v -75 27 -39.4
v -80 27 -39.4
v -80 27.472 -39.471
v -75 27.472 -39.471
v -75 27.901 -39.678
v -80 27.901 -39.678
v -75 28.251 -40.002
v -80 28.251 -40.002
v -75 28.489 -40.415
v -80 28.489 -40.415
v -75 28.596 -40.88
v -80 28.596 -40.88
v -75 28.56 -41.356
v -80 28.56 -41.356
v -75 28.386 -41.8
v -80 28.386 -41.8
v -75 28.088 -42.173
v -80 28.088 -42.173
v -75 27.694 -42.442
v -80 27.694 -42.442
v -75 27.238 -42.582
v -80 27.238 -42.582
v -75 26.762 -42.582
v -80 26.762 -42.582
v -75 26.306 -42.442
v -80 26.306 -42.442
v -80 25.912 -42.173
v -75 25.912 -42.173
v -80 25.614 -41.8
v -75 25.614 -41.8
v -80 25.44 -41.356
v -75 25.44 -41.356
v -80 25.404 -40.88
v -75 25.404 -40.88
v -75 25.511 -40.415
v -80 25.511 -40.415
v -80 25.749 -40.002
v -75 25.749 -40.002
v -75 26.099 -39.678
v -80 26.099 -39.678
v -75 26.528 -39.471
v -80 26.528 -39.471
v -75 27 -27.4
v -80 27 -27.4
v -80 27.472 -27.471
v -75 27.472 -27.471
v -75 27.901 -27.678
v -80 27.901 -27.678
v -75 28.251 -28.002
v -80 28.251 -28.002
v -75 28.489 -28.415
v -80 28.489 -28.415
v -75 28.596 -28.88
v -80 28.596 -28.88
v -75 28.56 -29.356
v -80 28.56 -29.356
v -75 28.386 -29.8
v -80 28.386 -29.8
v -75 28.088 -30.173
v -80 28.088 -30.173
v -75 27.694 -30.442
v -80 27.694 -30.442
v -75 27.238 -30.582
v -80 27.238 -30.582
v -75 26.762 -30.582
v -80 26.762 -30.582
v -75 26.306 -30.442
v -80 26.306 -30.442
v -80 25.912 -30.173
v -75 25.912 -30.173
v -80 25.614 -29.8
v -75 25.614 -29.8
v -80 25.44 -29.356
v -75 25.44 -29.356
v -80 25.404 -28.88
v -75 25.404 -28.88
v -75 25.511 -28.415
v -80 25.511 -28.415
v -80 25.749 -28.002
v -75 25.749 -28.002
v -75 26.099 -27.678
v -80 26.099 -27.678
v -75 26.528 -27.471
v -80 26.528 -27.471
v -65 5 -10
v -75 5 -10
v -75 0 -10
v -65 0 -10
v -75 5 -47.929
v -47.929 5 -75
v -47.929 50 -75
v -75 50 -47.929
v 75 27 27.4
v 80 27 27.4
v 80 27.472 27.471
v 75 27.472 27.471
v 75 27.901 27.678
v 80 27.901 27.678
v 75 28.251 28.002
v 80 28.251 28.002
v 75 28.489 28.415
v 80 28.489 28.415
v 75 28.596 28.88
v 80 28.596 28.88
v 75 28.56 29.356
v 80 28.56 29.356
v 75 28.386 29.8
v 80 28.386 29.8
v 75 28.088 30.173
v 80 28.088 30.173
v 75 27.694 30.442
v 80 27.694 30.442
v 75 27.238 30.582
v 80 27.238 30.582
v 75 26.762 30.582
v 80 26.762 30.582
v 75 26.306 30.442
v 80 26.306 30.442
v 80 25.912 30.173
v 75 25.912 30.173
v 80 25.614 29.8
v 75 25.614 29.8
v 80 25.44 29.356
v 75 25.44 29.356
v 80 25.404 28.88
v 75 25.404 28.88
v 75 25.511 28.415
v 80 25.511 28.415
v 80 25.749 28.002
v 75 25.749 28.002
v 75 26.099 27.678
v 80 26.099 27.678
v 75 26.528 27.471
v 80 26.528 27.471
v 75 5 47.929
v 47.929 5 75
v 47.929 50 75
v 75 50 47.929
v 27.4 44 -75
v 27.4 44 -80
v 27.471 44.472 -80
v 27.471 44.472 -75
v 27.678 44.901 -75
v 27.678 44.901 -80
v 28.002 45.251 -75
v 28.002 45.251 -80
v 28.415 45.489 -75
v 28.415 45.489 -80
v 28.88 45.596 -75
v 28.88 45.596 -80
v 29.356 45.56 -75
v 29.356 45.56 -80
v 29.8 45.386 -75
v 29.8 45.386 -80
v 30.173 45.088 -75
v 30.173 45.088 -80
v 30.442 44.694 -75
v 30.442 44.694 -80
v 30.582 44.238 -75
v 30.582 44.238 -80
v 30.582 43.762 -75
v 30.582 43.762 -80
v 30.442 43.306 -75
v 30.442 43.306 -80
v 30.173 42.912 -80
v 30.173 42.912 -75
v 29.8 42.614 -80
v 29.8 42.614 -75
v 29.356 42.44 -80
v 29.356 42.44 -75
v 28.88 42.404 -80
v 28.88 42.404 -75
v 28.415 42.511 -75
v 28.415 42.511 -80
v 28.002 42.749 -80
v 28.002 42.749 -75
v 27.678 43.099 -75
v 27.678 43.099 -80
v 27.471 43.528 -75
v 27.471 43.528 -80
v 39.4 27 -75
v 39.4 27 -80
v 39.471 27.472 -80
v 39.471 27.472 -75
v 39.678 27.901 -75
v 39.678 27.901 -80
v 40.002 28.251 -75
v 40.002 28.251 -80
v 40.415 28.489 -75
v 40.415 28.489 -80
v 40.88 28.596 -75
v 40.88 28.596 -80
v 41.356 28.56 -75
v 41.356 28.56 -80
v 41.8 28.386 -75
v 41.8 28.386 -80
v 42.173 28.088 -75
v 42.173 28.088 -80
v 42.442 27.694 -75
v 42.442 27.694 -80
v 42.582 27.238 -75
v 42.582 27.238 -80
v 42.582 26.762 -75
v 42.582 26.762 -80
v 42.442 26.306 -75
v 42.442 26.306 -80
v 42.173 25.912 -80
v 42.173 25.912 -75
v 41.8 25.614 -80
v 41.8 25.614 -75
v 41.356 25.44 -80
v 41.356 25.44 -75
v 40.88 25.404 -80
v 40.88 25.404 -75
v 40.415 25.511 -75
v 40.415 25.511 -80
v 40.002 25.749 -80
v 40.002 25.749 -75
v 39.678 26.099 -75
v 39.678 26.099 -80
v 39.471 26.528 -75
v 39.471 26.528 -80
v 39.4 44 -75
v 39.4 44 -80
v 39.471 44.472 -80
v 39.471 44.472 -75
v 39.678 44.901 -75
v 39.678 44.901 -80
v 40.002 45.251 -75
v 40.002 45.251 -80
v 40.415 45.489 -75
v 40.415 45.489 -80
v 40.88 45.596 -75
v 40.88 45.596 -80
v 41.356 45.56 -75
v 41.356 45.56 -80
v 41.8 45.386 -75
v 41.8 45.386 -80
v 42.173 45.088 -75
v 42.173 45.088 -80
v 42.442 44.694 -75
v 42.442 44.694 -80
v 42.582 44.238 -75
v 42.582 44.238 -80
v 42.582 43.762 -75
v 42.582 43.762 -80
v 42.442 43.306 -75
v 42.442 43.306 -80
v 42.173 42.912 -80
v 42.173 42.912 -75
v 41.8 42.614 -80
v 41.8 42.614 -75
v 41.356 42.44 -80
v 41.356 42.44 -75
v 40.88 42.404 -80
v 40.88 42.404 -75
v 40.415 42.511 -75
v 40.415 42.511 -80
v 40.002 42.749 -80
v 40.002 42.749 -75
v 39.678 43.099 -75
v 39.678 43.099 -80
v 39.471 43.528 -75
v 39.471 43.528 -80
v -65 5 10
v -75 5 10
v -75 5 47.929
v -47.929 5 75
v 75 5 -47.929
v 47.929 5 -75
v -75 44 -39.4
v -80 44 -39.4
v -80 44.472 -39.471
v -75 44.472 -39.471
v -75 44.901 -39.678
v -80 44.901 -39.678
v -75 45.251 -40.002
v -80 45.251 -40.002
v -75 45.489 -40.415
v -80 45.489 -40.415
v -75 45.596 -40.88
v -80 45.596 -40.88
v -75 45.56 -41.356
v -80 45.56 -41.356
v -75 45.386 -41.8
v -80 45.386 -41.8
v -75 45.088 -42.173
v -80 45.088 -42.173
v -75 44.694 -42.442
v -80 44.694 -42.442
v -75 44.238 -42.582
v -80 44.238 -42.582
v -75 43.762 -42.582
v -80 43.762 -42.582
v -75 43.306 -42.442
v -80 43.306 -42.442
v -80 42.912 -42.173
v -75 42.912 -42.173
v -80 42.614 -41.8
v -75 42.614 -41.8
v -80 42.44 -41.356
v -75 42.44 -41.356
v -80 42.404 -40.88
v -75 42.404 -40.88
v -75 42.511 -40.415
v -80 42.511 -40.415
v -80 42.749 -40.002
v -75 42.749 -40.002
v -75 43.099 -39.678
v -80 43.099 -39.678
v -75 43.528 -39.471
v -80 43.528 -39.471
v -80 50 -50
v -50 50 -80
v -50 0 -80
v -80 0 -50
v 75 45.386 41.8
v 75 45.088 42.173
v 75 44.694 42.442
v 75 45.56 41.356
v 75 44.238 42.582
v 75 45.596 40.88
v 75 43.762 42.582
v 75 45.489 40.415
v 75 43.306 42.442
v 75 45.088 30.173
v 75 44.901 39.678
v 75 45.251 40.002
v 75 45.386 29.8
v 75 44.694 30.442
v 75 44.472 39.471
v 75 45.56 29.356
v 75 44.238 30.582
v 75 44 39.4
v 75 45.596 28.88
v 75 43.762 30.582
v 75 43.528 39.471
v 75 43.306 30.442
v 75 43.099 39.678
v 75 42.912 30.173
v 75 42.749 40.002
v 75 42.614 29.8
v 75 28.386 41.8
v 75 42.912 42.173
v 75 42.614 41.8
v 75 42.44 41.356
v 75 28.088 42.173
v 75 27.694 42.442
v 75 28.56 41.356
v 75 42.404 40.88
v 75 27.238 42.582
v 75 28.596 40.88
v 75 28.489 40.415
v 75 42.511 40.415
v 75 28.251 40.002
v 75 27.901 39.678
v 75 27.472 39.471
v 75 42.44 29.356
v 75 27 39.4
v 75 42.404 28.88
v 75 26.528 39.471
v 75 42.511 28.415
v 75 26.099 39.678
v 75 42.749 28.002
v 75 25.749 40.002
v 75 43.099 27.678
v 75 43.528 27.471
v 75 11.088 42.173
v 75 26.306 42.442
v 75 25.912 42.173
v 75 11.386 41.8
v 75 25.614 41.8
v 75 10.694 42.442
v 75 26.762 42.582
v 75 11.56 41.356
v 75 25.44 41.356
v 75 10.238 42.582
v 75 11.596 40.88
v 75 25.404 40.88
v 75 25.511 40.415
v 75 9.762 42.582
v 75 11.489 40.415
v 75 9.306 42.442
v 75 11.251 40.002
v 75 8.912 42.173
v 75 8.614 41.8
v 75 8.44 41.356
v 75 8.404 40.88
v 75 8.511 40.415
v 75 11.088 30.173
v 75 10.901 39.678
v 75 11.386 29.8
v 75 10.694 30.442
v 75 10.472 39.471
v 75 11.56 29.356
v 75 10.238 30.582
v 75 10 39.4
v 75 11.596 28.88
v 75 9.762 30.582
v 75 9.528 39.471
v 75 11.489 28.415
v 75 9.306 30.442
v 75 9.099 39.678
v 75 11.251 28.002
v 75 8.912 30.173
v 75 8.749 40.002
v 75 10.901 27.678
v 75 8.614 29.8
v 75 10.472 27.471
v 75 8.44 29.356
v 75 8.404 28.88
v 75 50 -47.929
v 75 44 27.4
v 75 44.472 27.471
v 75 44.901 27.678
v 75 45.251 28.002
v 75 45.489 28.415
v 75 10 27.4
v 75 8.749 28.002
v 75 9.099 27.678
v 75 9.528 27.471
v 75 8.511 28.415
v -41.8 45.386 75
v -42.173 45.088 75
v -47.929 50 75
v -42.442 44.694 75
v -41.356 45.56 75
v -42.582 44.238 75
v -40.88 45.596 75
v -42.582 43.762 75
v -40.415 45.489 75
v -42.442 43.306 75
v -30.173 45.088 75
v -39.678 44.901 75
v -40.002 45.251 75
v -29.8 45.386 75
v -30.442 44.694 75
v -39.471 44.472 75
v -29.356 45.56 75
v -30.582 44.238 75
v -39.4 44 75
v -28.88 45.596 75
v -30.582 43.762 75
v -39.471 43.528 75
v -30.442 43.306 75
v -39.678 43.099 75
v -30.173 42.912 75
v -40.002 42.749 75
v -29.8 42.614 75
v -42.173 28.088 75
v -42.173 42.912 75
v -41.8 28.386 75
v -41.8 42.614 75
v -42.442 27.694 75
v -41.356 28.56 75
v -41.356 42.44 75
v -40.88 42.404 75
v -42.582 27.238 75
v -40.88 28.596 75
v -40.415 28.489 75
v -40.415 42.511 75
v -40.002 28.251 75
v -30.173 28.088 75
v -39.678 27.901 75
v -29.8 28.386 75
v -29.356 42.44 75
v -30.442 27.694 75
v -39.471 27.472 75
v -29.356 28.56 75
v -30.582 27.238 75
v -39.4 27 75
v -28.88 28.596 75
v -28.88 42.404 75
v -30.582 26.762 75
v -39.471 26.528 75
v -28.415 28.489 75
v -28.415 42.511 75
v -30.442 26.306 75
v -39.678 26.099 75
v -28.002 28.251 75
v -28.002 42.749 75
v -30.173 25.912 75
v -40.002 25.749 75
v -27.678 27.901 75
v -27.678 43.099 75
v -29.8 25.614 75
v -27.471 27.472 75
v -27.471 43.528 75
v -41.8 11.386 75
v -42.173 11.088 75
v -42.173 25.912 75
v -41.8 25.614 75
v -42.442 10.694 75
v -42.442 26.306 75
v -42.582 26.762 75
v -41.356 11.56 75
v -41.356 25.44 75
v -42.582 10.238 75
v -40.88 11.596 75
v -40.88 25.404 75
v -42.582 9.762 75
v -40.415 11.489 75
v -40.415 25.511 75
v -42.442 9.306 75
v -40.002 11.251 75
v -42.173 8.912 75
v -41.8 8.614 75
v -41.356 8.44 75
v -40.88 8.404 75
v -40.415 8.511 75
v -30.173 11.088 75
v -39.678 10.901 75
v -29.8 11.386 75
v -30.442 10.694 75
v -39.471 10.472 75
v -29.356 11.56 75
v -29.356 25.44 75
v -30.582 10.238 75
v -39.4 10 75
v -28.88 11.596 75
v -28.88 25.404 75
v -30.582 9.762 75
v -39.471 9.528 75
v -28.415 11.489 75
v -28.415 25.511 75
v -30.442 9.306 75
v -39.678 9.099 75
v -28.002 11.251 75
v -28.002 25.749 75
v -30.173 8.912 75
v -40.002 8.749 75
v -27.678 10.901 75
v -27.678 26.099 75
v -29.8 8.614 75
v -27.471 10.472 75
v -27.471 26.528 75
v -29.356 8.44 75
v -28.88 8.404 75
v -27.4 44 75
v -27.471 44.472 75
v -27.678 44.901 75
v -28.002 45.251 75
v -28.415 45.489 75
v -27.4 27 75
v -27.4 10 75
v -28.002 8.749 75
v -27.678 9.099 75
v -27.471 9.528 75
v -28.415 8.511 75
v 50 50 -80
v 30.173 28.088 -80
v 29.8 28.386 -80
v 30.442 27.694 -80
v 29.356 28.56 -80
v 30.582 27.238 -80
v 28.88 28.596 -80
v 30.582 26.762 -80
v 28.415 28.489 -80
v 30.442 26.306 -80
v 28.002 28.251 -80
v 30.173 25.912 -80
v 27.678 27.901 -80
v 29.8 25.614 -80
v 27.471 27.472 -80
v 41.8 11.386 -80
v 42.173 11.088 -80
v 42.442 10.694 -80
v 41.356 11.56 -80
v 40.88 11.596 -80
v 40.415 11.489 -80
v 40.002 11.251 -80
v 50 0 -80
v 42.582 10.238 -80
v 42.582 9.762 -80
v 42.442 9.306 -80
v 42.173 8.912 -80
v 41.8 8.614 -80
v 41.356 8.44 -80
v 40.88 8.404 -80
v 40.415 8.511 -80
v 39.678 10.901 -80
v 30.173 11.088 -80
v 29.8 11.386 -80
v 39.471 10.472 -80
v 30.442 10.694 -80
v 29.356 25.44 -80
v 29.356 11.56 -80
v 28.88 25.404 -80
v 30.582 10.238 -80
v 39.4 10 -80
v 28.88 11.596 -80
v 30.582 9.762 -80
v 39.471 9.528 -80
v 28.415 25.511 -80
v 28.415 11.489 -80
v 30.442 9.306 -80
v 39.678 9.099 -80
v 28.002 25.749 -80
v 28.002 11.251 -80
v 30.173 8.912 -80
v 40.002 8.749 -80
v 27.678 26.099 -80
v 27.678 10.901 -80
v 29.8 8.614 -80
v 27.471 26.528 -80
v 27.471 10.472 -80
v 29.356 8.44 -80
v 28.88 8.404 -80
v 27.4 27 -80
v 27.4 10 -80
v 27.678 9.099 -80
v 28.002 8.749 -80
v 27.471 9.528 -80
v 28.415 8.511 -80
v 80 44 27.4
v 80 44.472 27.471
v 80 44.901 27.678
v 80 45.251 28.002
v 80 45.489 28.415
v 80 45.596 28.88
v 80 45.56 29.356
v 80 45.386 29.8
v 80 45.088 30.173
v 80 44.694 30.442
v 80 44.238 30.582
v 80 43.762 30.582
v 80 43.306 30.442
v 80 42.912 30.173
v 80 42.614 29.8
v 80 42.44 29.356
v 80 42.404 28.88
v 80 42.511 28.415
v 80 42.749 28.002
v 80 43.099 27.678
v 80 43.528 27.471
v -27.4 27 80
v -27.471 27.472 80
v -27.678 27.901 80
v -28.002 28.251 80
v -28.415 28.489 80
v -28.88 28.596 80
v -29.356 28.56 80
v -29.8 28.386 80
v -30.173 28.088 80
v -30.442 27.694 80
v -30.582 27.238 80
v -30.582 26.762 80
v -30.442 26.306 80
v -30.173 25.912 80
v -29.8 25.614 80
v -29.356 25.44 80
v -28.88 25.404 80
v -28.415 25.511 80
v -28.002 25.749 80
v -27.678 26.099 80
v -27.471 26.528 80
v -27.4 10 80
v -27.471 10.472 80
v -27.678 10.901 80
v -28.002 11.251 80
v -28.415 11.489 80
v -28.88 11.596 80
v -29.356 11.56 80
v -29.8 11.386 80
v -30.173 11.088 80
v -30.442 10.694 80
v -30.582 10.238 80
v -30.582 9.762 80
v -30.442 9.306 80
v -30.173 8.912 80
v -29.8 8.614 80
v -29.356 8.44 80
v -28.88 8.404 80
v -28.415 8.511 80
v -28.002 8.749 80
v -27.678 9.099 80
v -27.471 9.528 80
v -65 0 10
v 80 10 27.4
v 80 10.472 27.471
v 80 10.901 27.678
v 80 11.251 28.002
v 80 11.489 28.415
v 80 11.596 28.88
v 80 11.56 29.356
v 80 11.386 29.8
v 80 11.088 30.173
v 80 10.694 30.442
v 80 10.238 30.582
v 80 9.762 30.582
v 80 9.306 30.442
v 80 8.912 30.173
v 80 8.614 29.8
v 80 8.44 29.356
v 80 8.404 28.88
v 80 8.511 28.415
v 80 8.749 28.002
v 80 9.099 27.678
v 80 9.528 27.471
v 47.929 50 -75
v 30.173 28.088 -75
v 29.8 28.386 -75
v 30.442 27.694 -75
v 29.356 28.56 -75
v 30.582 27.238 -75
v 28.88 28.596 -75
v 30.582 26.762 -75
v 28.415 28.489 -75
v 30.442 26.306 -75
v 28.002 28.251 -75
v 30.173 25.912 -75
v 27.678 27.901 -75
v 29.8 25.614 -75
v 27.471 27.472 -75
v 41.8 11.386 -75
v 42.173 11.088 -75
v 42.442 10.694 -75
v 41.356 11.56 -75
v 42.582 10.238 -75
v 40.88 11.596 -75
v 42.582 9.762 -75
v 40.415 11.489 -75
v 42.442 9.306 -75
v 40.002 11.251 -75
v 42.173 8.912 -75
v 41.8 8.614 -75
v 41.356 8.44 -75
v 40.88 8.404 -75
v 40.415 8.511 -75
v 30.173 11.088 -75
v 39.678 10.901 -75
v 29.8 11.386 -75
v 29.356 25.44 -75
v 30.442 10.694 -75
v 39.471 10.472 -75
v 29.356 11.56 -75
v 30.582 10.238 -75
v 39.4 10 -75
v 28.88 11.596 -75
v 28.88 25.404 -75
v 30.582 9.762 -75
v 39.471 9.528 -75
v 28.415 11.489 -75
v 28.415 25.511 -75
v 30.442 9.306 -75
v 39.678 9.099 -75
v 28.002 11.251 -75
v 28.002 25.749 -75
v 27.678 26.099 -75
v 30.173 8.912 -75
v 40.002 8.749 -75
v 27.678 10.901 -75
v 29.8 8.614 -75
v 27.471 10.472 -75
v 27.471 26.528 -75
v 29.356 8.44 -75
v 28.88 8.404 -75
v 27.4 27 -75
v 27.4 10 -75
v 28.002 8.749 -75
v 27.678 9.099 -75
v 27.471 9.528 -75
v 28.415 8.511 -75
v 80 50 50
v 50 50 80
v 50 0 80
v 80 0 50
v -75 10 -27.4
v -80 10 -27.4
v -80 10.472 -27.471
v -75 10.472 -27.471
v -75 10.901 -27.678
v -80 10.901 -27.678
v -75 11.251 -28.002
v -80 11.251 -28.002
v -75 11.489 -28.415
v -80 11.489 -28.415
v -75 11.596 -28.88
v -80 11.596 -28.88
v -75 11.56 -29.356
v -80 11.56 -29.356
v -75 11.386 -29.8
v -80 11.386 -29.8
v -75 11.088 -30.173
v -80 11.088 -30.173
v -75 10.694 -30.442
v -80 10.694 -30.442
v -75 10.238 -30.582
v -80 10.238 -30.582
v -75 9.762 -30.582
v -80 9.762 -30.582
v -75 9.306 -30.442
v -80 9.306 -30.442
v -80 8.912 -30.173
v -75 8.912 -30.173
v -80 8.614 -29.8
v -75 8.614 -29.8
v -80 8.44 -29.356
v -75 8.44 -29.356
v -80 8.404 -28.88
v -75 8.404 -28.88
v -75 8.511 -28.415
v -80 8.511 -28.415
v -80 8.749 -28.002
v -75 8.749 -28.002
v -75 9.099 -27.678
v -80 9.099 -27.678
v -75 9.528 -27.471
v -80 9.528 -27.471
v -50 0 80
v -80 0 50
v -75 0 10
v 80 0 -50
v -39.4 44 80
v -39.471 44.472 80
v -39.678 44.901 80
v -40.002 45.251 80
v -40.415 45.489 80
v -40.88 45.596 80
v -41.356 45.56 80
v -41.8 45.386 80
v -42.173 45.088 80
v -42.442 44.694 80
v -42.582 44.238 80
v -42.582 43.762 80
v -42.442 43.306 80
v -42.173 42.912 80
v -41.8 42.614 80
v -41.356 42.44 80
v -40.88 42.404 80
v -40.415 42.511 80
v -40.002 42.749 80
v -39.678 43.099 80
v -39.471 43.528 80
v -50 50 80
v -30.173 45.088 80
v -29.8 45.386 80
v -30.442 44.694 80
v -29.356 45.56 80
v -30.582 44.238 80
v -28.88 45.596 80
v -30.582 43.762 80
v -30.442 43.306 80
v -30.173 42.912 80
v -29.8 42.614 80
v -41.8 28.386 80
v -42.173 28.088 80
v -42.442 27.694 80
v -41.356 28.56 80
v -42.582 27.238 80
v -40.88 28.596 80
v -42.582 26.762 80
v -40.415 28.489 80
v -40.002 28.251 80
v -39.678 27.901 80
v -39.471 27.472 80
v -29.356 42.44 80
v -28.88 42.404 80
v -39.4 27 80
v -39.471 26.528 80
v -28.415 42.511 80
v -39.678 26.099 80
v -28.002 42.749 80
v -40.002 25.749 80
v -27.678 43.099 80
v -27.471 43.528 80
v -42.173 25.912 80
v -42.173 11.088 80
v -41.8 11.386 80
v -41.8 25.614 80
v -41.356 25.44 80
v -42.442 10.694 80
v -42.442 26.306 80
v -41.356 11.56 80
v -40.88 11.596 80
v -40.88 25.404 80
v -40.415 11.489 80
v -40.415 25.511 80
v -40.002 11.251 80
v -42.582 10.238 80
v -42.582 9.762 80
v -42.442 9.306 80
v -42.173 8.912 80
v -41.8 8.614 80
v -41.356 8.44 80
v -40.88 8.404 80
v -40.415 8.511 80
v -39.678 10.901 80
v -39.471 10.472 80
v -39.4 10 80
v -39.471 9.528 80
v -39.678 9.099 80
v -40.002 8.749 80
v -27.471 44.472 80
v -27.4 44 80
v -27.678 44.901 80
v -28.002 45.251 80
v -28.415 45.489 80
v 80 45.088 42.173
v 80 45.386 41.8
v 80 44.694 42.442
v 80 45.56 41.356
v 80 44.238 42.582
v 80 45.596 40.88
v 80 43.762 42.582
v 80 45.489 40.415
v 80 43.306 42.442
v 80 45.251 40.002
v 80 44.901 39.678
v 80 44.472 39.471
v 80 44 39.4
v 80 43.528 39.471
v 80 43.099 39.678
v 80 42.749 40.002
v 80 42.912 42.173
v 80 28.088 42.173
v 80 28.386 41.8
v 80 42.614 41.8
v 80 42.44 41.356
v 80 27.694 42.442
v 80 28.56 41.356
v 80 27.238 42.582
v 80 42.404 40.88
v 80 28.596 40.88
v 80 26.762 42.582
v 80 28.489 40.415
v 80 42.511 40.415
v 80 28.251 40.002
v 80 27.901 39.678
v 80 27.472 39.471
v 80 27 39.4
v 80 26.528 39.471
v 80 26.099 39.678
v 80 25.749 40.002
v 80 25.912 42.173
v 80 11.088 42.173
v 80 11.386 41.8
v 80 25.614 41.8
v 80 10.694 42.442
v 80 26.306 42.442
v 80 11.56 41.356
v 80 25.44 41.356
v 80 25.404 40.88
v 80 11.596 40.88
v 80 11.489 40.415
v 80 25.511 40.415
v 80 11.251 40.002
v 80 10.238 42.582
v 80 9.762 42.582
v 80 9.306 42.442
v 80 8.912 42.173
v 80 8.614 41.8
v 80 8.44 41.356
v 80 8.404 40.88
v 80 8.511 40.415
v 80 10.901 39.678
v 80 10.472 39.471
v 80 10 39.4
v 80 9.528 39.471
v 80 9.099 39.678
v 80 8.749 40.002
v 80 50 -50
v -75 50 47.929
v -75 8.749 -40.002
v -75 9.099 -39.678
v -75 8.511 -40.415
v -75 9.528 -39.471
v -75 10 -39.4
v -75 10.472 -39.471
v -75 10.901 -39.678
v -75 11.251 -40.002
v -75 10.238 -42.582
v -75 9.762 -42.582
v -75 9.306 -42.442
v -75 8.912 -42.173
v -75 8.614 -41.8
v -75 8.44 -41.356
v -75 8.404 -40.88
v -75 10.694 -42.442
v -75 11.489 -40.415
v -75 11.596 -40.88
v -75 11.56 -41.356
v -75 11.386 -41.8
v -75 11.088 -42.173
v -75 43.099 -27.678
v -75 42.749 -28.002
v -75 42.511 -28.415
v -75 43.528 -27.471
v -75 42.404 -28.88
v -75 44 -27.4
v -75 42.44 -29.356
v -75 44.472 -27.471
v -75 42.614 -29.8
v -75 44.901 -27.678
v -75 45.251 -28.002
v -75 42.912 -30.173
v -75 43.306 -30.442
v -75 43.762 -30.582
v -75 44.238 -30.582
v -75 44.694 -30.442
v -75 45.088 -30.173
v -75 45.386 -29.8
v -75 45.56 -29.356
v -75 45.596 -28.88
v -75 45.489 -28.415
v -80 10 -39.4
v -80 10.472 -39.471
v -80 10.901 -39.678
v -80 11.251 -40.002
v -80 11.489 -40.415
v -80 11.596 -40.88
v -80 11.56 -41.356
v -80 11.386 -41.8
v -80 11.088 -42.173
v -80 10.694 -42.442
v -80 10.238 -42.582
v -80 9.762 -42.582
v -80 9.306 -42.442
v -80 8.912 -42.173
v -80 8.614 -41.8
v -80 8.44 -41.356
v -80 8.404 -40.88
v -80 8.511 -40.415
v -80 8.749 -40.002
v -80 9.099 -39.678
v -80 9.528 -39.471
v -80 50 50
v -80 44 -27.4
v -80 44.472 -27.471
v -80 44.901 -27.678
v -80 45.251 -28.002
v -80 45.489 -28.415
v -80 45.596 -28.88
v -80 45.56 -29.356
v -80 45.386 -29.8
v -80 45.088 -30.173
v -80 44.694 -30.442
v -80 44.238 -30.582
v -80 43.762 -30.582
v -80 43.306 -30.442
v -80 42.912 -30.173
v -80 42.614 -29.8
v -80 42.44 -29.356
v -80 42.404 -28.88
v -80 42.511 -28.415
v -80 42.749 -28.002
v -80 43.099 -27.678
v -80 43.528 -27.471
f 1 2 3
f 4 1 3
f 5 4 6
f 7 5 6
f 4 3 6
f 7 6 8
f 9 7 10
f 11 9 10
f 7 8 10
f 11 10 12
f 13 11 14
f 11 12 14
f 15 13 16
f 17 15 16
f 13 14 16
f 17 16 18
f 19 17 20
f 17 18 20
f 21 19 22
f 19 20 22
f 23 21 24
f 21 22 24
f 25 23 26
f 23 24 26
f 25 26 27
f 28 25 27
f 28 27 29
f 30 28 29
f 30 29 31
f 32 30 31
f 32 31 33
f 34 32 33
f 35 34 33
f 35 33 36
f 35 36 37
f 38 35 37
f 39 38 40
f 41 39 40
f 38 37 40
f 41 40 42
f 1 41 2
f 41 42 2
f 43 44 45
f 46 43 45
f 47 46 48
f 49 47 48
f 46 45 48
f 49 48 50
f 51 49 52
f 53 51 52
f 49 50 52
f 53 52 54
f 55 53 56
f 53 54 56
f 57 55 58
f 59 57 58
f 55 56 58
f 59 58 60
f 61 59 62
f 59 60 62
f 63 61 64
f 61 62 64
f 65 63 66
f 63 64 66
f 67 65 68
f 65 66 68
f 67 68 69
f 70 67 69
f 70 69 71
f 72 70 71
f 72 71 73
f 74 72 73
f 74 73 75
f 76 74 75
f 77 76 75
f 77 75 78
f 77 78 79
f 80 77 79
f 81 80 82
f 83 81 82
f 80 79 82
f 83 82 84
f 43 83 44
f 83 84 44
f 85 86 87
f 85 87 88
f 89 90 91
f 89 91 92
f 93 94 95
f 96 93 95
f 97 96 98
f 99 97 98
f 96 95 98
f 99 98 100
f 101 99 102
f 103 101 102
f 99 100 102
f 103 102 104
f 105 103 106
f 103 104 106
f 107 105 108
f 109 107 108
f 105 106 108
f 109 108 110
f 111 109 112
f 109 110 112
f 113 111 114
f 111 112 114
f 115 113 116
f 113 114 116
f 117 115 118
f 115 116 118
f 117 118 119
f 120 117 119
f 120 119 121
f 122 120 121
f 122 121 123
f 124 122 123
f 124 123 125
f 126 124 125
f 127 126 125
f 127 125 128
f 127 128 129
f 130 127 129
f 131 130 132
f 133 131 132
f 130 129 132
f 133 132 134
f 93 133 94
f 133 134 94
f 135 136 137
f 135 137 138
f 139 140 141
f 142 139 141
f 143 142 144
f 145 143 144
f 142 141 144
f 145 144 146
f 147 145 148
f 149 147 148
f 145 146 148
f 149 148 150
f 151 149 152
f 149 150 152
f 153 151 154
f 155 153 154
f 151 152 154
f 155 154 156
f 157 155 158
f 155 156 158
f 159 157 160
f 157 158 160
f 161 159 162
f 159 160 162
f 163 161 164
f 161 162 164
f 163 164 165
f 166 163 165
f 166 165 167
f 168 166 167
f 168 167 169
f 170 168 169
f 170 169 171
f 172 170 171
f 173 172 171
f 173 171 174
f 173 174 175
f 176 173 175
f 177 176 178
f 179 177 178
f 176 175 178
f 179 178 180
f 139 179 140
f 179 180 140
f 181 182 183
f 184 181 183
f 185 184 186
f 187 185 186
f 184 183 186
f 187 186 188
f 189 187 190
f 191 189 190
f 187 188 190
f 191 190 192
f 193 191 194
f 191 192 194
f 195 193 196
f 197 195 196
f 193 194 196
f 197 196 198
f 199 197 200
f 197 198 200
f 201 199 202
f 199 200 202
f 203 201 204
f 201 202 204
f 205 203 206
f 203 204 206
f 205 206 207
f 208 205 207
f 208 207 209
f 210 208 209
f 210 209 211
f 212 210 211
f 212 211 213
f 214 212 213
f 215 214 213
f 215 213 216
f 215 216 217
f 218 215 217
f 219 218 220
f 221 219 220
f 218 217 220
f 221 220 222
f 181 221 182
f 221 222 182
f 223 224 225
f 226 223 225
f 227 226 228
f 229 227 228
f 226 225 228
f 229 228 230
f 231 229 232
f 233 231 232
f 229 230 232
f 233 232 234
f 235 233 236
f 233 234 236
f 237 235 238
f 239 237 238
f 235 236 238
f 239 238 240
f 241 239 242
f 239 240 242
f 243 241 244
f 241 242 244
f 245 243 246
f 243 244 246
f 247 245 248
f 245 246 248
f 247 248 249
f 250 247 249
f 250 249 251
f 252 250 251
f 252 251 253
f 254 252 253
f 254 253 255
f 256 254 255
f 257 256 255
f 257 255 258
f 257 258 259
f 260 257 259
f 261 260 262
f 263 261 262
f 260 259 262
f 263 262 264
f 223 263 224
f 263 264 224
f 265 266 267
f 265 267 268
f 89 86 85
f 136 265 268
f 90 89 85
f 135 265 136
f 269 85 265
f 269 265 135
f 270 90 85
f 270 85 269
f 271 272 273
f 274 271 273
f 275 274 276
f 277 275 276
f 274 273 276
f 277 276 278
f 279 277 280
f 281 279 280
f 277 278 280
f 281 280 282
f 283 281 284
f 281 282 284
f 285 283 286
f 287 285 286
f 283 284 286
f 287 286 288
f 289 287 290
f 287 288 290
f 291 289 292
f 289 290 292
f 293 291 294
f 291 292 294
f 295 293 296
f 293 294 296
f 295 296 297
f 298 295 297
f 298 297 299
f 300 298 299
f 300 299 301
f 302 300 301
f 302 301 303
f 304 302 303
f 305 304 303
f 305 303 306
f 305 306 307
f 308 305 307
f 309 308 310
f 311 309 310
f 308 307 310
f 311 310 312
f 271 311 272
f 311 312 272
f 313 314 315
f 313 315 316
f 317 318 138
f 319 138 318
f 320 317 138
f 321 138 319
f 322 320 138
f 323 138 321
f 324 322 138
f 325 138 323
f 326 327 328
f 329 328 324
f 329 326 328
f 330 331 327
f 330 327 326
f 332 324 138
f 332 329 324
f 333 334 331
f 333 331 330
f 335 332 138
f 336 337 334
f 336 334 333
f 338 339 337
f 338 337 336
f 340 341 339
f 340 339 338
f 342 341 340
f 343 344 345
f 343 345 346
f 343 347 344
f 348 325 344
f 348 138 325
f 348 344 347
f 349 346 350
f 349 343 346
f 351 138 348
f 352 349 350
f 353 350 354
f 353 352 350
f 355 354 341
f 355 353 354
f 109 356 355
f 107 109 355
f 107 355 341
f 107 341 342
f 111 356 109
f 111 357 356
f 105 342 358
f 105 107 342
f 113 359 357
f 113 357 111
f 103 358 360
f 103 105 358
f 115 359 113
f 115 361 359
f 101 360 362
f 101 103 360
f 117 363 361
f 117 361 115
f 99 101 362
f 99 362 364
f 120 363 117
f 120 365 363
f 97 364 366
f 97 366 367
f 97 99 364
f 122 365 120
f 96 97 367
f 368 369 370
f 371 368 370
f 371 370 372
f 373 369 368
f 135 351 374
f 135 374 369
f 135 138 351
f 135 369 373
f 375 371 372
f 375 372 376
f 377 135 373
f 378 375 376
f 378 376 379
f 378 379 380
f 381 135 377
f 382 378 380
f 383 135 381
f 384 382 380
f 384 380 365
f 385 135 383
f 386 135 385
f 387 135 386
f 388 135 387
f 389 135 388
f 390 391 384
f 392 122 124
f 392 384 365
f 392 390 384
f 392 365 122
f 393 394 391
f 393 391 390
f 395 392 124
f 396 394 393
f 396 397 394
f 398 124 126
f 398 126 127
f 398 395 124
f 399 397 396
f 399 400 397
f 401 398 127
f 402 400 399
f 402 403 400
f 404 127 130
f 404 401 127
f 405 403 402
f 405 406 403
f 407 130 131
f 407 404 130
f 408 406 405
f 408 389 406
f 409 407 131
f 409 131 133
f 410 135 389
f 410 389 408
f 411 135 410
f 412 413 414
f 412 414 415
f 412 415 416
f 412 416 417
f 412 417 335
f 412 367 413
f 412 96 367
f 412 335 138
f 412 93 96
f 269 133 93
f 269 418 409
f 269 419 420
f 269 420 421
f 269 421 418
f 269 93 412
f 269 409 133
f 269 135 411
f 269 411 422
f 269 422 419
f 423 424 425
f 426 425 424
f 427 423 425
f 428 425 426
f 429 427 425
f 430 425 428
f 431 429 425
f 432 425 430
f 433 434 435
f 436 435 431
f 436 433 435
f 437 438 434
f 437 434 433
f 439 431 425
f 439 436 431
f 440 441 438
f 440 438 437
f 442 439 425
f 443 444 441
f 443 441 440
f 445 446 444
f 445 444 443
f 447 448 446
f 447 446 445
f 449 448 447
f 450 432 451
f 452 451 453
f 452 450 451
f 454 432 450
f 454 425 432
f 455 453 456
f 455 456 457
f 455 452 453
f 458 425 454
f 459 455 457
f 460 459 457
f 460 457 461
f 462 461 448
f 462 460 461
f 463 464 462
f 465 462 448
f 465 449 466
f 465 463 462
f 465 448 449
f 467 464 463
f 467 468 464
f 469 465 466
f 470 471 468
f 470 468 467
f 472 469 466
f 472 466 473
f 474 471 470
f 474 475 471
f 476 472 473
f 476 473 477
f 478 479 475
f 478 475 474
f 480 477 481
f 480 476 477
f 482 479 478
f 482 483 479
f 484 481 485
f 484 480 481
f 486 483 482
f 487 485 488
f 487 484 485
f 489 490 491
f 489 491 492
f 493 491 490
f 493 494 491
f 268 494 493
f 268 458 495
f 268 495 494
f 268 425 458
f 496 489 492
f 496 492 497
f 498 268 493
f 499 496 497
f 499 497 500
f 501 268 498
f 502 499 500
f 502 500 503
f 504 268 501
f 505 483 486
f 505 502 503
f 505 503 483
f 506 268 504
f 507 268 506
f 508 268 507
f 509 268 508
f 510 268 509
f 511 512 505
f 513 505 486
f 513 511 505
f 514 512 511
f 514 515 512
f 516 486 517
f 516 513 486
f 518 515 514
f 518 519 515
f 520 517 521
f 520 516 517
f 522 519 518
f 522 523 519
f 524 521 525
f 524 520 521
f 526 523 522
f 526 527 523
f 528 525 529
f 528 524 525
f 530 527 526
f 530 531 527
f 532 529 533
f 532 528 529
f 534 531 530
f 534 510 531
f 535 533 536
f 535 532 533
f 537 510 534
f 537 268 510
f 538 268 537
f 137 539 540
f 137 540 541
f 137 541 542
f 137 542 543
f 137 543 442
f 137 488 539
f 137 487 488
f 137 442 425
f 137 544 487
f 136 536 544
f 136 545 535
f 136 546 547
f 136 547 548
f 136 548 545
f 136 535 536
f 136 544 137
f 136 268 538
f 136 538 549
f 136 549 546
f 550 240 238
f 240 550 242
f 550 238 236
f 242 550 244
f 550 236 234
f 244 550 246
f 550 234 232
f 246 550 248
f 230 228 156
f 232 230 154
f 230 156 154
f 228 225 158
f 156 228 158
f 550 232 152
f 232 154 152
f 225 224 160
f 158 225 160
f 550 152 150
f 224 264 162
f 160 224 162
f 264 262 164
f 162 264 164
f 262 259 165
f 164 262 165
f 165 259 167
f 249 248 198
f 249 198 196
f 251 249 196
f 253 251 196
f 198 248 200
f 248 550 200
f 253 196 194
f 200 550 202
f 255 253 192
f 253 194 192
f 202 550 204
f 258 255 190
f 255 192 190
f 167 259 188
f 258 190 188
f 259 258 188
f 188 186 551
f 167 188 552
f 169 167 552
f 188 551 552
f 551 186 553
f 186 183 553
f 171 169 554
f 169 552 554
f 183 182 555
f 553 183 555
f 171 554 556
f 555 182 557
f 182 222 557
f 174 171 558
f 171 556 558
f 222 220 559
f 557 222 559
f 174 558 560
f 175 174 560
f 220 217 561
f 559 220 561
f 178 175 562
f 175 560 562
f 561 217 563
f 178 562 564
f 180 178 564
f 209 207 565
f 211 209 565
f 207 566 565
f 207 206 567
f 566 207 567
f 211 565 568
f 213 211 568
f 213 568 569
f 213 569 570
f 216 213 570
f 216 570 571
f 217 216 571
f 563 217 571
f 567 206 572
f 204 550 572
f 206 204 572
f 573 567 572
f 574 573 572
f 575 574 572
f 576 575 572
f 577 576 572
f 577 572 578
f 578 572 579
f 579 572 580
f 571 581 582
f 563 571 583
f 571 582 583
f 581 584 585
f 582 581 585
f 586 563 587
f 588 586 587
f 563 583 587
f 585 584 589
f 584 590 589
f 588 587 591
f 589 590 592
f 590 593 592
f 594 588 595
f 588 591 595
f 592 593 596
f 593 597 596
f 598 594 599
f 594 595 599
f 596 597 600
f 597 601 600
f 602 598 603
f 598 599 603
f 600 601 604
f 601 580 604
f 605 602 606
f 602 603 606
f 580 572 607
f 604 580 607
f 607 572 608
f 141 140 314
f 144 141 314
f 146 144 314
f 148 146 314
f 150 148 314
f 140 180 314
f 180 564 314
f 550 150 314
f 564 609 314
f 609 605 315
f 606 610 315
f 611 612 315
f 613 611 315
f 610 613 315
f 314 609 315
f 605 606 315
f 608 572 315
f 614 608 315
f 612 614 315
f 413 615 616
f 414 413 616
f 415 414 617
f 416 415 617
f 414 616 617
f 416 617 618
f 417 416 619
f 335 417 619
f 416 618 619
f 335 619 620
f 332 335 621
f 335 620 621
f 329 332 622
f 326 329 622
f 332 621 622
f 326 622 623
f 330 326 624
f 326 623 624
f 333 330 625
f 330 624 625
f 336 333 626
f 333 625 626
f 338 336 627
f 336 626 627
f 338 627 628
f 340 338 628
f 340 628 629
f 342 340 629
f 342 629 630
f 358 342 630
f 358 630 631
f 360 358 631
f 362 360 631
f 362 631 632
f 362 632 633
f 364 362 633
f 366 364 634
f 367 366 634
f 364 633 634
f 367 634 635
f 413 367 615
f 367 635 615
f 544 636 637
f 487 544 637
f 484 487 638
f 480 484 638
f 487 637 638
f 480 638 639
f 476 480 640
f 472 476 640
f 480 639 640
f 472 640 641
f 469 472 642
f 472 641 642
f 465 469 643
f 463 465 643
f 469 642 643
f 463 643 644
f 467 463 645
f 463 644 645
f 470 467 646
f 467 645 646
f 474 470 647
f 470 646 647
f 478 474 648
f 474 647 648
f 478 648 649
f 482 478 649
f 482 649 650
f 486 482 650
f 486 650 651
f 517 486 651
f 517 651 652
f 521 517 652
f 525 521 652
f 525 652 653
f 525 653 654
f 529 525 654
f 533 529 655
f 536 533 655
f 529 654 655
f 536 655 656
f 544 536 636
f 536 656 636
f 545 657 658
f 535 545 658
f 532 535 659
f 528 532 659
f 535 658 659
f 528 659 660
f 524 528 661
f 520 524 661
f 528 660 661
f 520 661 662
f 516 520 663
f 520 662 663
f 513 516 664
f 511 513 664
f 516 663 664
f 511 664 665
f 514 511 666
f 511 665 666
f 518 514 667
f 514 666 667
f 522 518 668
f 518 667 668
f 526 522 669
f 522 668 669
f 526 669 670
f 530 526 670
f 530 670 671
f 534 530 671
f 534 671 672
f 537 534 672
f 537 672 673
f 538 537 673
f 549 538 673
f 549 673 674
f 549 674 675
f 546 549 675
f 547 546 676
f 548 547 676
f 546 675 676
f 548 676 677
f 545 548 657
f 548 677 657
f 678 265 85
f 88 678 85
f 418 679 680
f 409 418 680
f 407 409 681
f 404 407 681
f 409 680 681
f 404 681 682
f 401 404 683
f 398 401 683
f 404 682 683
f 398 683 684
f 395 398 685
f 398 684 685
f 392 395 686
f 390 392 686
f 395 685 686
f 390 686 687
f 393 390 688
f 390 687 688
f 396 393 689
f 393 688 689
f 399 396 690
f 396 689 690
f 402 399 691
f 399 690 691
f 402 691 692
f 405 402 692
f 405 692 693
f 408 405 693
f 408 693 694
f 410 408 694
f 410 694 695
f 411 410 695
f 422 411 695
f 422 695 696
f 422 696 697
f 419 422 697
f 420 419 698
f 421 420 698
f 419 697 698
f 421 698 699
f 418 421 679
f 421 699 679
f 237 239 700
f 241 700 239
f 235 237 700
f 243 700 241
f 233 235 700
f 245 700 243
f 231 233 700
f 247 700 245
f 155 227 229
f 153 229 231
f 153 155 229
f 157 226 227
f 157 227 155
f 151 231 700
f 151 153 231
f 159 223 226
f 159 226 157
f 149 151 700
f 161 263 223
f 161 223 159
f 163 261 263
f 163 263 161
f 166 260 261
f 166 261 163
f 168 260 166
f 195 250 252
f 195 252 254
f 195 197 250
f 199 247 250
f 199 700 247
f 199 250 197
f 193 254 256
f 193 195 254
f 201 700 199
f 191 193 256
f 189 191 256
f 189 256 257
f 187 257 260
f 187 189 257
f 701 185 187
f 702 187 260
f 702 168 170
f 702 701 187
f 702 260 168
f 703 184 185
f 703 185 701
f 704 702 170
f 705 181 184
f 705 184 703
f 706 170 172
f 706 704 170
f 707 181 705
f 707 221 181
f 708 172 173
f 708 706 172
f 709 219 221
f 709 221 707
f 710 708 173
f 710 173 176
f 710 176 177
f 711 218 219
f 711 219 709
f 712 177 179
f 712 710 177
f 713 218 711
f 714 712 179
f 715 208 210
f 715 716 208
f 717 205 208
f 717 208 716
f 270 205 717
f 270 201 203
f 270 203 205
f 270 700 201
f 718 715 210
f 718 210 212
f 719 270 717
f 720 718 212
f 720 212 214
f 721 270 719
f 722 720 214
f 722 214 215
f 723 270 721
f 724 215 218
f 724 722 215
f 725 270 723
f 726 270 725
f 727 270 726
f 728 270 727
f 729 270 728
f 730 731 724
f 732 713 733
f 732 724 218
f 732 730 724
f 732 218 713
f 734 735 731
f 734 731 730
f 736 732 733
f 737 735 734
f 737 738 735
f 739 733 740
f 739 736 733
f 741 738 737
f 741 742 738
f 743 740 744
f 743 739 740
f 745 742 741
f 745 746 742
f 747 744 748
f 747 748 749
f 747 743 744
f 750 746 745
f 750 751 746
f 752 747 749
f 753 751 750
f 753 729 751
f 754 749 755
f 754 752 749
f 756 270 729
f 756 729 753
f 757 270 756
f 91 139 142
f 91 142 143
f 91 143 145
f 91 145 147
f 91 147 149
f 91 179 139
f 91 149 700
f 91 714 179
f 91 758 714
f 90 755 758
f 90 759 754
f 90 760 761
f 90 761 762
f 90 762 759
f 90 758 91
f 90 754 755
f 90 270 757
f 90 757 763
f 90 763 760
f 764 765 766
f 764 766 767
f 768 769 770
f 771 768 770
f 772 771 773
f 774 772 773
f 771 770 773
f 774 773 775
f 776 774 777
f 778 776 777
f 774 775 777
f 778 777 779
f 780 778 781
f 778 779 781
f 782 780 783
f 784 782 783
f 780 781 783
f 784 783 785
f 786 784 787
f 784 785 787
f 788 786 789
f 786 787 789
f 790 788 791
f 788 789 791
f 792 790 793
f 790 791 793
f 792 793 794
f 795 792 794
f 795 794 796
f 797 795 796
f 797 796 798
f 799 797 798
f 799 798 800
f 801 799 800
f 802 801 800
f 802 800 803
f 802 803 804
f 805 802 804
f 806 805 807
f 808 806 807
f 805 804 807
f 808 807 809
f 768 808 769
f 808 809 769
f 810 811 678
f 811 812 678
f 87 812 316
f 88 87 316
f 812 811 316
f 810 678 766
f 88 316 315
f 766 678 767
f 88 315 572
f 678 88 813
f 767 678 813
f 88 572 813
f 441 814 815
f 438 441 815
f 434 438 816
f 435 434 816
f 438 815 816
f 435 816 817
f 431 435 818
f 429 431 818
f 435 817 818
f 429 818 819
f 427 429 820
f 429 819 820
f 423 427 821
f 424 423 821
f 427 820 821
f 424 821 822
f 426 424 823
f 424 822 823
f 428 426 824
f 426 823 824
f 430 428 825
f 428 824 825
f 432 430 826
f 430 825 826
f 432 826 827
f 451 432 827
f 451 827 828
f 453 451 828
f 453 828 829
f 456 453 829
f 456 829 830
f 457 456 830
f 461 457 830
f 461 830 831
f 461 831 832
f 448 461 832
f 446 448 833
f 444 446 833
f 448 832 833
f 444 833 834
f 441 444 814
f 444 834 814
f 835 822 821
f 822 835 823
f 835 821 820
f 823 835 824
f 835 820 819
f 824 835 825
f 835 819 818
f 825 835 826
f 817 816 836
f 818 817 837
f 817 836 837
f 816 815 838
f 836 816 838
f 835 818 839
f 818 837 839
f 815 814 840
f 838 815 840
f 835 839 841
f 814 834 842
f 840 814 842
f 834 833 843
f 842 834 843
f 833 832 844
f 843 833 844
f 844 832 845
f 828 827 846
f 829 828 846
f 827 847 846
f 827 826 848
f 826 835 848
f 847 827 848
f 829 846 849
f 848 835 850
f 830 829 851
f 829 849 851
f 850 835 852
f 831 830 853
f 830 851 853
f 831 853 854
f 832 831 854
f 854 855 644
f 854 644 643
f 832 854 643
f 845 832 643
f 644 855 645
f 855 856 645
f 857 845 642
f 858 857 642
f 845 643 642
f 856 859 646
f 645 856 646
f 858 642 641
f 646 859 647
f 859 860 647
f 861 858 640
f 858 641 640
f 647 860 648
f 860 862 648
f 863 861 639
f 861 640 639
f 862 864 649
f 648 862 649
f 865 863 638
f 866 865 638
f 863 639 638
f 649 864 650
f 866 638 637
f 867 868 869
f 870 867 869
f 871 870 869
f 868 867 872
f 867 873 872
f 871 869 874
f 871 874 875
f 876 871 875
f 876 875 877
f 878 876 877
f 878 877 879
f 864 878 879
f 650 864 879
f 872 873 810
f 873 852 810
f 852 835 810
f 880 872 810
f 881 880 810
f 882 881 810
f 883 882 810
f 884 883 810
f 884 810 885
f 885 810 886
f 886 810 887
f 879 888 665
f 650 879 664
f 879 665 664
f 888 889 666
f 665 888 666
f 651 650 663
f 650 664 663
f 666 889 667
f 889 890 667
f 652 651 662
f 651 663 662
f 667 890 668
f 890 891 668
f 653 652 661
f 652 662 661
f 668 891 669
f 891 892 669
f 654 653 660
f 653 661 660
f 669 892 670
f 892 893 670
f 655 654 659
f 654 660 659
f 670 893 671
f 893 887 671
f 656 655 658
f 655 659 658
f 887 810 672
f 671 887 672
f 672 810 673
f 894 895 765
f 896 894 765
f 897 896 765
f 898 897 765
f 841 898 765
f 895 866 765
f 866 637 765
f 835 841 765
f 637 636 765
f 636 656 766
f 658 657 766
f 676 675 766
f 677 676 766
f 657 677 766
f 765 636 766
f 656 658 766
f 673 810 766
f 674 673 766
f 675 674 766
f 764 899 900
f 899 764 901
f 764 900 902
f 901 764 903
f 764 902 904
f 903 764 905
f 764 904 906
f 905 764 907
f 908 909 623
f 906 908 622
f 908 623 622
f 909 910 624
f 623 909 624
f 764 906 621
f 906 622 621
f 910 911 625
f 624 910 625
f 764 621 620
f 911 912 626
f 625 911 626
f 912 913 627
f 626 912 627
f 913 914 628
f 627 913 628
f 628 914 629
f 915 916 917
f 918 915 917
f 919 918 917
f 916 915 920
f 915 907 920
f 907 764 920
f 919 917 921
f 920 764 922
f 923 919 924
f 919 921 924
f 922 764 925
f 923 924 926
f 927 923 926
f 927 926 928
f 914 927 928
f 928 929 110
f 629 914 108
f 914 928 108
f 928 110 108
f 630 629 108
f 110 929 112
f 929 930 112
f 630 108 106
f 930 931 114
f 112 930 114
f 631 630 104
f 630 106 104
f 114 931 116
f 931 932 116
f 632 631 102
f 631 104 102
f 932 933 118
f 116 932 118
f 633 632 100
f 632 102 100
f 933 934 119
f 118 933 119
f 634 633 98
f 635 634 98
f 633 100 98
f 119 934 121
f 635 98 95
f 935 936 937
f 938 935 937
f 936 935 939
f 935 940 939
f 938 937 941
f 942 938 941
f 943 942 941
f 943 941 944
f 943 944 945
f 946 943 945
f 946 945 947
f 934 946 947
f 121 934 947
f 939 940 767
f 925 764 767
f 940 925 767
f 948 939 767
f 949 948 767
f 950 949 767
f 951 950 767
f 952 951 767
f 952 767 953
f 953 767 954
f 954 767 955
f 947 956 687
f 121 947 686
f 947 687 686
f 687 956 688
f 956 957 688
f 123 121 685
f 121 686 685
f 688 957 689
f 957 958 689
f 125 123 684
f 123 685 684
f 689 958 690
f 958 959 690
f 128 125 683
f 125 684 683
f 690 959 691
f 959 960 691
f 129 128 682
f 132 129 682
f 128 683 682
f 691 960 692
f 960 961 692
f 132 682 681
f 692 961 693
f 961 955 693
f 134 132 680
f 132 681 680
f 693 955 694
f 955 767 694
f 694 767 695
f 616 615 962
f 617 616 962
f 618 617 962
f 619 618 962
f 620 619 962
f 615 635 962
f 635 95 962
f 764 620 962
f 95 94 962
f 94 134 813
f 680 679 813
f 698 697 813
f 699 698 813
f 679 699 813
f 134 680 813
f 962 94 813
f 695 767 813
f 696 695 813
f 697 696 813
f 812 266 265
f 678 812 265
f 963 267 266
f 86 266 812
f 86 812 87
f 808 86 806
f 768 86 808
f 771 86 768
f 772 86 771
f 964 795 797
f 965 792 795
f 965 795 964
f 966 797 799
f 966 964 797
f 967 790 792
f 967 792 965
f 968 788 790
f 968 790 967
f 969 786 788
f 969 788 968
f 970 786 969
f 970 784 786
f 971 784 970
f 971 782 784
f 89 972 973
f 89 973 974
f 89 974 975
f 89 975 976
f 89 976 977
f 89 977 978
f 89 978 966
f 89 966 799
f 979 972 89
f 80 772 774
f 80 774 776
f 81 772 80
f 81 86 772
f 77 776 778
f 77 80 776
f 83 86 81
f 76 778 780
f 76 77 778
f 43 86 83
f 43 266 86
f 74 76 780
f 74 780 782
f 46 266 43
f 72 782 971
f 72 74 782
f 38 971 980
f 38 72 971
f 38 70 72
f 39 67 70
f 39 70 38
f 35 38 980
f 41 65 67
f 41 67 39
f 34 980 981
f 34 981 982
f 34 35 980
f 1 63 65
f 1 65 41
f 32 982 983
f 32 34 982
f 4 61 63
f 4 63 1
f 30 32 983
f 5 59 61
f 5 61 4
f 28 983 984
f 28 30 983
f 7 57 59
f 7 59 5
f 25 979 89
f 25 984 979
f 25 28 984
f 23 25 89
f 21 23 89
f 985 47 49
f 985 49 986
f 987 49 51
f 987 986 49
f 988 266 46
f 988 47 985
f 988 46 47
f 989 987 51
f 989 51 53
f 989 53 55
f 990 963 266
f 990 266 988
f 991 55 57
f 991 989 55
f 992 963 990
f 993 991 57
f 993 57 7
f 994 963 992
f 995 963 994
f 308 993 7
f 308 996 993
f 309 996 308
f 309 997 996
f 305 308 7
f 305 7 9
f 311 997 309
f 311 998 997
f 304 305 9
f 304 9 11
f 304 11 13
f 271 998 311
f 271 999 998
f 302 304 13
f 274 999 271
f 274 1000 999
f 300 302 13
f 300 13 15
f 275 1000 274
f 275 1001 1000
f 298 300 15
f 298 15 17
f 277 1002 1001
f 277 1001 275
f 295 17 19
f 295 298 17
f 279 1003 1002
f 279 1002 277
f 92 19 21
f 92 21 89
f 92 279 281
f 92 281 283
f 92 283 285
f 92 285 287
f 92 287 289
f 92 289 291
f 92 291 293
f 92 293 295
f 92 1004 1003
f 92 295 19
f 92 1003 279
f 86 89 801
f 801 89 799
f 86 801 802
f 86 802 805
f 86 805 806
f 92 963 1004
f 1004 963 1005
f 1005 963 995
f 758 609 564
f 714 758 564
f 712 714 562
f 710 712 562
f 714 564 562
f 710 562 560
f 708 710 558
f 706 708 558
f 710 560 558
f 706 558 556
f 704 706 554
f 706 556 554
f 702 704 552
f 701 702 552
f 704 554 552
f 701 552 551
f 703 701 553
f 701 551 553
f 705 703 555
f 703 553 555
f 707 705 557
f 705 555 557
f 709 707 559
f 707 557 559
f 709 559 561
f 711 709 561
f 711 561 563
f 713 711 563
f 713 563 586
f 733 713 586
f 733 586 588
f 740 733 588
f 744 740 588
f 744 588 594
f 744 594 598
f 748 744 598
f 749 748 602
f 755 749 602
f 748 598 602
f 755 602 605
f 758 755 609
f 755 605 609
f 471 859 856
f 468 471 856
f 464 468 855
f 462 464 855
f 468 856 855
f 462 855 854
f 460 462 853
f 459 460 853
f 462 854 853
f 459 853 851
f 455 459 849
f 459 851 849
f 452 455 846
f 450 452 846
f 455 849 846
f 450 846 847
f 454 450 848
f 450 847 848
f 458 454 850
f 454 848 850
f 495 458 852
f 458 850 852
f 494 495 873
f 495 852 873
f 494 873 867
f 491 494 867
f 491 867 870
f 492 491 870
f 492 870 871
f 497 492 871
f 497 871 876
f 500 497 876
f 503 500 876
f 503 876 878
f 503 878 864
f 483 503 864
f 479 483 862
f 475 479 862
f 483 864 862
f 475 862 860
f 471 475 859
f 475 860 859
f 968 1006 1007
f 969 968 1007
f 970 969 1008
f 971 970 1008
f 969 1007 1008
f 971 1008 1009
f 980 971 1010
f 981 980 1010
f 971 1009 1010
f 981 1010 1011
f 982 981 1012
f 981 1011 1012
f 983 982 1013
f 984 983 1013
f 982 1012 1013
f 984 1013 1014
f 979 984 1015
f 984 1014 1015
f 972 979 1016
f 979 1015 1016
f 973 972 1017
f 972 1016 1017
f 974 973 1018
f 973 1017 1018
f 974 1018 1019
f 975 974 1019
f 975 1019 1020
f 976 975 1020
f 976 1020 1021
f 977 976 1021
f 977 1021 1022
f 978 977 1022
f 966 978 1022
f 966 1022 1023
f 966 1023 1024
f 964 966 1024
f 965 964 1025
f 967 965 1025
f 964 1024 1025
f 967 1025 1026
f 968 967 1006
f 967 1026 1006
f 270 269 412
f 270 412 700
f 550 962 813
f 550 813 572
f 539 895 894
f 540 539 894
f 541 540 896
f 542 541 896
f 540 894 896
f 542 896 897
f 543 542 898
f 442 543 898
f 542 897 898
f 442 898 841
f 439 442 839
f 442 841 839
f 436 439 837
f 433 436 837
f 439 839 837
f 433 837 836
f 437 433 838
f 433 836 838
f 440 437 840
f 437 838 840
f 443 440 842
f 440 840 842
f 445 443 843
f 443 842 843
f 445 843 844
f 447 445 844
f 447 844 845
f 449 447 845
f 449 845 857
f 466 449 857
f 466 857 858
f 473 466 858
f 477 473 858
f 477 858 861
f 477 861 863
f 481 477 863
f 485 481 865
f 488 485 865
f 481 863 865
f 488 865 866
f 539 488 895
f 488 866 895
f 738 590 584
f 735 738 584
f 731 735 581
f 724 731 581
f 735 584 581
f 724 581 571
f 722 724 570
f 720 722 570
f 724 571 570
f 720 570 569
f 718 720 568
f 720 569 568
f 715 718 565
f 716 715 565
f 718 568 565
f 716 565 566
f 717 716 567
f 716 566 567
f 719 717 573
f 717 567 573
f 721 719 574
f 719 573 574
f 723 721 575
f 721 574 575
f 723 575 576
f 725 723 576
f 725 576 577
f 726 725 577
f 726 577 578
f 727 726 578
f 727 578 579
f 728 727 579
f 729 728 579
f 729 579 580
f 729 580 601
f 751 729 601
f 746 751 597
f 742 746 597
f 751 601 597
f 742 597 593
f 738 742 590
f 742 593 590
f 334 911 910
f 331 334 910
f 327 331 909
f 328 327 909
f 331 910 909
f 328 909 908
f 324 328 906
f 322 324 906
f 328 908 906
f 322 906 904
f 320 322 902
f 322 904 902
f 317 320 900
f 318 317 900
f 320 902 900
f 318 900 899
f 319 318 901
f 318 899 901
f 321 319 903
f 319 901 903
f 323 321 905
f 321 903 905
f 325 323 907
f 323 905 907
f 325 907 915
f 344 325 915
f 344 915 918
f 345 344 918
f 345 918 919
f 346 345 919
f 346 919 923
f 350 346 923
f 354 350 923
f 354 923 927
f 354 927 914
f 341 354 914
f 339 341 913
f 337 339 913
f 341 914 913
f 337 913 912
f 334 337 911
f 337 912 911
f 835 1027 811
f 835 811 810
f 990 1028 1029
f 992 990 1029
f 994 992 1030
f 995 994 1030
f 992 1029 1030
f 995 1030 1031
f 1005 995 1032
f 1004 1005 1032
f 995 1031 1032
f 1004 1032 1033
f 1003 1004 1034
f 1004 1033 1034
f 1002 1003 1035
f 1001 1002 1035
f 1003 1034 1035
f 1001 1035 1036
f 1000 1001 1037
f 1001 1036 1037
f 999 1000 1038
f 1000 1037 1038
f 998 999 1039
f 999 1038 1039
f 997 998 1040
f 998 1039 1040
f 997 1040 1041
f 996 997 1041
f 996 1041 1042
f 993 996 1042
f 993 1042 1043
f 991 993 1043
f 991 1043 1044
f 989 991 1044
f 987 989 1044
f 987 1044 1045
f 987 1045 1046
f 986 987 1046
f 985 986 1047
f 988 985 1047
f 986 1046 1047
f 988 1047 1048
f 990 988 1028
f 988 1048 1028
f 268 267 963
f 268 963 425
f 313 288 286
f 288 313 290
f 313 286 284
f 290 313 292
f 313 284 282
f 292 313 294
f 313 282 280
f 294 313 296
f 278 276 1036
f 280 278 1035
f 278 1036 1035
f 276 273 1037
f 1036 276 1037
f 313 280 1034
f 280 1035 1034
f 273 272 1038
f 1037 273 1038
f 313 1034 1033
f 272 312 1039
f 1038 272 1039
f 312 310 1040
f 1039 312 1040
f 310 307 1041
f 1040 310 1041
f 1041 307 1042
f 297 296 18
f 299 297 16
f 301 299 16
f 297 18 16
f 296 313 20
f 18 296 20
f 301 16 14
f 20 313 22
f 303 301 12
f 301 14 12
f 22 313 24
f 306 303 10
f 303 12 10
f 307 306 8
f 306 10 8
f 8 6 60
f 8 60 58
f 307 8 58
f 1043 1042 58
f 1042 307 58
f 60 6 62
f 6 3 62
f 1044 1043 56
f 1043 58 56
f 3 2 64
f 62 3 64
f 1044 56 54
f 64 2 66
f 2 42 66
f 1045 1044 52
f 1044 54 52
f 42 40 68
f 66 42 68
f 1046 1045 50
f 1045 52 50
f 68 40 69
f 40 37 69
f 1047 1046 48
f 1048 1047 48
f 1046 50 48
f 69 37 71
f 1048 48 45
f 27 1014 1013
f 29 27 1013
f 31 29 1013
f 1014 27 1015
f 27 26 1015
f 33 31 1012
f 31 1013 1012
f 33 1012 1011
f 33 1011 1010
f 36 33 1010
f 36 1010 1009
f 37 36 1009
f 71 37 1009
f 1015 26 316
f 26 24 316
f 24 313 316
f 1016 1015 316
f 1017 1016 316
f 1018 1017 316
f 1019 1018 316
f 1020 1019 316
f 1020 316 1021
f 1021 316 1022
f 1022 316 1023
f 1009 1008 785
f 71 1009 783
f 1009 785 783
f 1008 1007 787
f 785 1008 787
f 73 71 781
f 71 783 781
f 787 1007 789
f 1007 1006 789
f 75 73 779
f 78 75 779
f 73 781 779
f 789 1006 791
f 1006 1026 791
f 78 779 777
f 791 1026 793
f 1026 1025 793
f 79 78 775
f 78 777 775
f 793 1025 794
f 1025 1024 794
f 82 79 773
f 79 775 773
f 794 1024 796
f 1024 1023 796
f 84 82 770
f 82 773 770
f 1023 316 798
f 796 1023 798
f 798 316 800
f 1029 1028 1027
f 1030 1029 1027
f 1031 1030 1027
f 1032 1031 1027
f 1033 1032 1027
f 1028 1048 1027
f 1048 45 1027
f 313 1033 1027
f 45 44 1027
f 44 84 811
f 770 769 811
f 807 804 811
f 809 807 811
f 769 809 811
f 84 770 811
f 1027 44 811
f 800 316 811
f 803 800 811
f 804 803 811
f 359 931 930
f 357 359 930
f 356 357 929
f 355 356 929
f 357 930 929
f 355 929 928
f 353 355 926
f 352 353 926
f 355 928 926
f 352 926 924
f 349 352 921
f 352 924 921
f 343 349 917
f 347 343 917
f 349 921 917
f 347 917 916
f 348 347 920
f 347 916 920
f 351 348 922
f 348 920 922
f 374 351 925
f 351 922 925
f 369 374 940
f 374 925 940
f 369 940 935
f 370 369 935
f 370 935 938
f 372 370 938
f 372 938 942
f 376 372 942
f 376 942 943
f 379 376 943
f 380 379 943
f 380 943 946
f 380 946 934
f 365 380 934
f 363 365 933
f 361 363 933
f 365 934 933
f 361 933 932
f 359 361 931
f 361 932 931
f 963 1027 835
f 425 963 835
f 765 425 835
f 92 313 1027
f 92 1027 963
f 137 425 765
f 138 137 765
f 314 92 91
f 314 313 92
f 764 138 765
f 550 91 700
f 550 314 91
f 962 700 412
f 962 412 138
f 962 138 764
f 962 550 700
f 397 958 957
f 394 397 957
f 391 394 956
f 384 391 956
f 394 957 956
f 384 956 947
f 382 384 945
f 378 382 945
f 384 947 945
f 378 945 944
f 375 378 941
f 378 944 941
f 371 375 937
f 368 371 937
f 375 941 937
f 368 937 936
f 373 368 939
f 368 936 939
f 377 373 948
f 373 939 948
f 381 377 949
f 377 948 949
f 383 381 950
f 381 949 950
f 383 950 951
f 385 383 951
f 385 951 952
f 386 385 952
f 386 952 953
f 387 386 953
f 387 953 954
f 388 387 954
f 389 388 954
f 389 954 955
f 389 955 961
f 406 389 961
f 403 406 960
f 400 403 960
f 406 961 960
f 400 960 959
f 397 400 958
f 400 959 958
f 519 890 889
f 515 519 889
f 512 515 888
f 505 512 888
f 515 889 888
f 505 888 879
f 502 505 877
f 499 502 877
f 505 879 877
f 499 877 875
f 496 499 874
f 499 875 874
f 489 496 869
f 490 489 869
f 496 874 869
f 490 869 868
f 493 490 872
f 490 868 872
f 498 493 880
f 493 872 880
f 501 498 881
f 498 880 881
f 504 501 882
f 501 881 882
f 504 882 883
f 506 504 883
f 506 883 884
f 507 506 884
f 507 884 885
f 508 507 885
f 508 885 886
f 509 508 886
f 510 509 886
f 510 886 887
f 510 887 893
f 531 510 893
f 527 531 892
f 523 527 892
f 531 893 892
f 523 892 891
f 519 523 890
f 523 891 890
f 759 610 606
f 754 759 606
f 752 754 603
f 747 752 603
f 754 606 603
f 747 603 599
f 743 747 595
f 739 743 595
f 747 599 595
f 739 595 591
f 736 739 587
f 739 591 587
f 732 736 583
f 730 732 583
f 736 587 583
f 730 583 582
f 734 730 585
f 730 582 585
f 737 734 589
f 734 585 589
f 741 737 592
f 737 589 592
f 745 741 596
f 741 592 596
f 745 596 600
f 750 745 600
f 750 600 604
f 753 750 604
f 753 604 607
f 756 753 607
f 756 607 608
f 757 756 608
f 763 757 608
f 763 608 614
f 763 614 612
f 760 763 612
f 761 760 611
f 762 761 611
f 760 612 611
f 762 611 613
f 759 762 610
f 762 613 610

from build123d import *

# Parameters (mm, degrees)
BOSS_EXTRUDE1_DEPTH = 50
SHELL1_T            = -5
SKETCH5_W           = 10
SKETCH5_H           = 20
CUT_EXTRUDE1_DEPTH  = 5
SKETCH6_R           = 1.6
CUT_EXTRUDE2_DEPTH  = 5
CIRPATTERN1_COUNT   = 4


with BuildPart() as part:
    # Sketch1 → Boss-Extrude1 (new body)
    with BuildSketch(Plane(origin=(0, 0, 0), x_dir=(1, 0, 0), z_dir=(0, 1, 0))):
        Polygon((-50, 80), (-80, 50), (-80, -50), (-50, -80), (50, -80), (80, -50), (80, 50), (50, 80), align=None)
    extrude(amount=BOSS_EXTRUDE1_DEPTH)

    # Shell1
    shell1_openings = [part.faces().sort_by_distance(p)[0] for p in [
        (0, 50, 0),
    ]]
    offset(amount=SHELL1_T, openings=shell1_openings, kind=Kind.INTERSECTION)

    # Sketch5 → Cut-Extrude1 (cut)
    with BuildSketch(Plane(origin=(0, 5, 0), x_dir=(1, 0, 0), z_dir=(0, 1, 0))):
        with Locations((-70, 0)):
            Rectangle(SKETCH5_W, SKETCH5_H)
    extrude(amount=-CUT_EXTRUDE1_DEPTH, mode=Mode.SUBTRACT)

    # Sketch6 → Cut-Extrude2 (cut)
    with BuildSketch(Plane.XY.offset(80)):
        with Locations((-29, 10)):
            Circle(SKETCH6_R)
        with Locations((-41, 10)):
            Circle(SKETCH6_R)
        with Locations((-29, 27)):
            Circle(SKETCH6_R)
        with Locations((-41, 27)):
            Circle(SKETCH6_R)
        with Locations((-29, 44)):
            Circle(SKETCH6_R)
        with Locations((-41, 44)):
            Circle(SKETCH6_R)
    cut_extrude2 = extrude(amount=-CUT_EXTRUDE2_DEPTH, mode=Mode.SUBTRACT)

    # CirPattern1: Cut-Extrude2 ×4 about axis
    cirpattern1_axis = Axis((0, 52.5, 0), (0, -1, 0))
    for i in range(1, CIRPATTERN1_COUNT):
        add(cut_extrude2.rotate(cirpattern1_axis, i * 360 / CIRPATTERN1_COUNT), mode=Mode.SUBTRACT)


solid = part.part
